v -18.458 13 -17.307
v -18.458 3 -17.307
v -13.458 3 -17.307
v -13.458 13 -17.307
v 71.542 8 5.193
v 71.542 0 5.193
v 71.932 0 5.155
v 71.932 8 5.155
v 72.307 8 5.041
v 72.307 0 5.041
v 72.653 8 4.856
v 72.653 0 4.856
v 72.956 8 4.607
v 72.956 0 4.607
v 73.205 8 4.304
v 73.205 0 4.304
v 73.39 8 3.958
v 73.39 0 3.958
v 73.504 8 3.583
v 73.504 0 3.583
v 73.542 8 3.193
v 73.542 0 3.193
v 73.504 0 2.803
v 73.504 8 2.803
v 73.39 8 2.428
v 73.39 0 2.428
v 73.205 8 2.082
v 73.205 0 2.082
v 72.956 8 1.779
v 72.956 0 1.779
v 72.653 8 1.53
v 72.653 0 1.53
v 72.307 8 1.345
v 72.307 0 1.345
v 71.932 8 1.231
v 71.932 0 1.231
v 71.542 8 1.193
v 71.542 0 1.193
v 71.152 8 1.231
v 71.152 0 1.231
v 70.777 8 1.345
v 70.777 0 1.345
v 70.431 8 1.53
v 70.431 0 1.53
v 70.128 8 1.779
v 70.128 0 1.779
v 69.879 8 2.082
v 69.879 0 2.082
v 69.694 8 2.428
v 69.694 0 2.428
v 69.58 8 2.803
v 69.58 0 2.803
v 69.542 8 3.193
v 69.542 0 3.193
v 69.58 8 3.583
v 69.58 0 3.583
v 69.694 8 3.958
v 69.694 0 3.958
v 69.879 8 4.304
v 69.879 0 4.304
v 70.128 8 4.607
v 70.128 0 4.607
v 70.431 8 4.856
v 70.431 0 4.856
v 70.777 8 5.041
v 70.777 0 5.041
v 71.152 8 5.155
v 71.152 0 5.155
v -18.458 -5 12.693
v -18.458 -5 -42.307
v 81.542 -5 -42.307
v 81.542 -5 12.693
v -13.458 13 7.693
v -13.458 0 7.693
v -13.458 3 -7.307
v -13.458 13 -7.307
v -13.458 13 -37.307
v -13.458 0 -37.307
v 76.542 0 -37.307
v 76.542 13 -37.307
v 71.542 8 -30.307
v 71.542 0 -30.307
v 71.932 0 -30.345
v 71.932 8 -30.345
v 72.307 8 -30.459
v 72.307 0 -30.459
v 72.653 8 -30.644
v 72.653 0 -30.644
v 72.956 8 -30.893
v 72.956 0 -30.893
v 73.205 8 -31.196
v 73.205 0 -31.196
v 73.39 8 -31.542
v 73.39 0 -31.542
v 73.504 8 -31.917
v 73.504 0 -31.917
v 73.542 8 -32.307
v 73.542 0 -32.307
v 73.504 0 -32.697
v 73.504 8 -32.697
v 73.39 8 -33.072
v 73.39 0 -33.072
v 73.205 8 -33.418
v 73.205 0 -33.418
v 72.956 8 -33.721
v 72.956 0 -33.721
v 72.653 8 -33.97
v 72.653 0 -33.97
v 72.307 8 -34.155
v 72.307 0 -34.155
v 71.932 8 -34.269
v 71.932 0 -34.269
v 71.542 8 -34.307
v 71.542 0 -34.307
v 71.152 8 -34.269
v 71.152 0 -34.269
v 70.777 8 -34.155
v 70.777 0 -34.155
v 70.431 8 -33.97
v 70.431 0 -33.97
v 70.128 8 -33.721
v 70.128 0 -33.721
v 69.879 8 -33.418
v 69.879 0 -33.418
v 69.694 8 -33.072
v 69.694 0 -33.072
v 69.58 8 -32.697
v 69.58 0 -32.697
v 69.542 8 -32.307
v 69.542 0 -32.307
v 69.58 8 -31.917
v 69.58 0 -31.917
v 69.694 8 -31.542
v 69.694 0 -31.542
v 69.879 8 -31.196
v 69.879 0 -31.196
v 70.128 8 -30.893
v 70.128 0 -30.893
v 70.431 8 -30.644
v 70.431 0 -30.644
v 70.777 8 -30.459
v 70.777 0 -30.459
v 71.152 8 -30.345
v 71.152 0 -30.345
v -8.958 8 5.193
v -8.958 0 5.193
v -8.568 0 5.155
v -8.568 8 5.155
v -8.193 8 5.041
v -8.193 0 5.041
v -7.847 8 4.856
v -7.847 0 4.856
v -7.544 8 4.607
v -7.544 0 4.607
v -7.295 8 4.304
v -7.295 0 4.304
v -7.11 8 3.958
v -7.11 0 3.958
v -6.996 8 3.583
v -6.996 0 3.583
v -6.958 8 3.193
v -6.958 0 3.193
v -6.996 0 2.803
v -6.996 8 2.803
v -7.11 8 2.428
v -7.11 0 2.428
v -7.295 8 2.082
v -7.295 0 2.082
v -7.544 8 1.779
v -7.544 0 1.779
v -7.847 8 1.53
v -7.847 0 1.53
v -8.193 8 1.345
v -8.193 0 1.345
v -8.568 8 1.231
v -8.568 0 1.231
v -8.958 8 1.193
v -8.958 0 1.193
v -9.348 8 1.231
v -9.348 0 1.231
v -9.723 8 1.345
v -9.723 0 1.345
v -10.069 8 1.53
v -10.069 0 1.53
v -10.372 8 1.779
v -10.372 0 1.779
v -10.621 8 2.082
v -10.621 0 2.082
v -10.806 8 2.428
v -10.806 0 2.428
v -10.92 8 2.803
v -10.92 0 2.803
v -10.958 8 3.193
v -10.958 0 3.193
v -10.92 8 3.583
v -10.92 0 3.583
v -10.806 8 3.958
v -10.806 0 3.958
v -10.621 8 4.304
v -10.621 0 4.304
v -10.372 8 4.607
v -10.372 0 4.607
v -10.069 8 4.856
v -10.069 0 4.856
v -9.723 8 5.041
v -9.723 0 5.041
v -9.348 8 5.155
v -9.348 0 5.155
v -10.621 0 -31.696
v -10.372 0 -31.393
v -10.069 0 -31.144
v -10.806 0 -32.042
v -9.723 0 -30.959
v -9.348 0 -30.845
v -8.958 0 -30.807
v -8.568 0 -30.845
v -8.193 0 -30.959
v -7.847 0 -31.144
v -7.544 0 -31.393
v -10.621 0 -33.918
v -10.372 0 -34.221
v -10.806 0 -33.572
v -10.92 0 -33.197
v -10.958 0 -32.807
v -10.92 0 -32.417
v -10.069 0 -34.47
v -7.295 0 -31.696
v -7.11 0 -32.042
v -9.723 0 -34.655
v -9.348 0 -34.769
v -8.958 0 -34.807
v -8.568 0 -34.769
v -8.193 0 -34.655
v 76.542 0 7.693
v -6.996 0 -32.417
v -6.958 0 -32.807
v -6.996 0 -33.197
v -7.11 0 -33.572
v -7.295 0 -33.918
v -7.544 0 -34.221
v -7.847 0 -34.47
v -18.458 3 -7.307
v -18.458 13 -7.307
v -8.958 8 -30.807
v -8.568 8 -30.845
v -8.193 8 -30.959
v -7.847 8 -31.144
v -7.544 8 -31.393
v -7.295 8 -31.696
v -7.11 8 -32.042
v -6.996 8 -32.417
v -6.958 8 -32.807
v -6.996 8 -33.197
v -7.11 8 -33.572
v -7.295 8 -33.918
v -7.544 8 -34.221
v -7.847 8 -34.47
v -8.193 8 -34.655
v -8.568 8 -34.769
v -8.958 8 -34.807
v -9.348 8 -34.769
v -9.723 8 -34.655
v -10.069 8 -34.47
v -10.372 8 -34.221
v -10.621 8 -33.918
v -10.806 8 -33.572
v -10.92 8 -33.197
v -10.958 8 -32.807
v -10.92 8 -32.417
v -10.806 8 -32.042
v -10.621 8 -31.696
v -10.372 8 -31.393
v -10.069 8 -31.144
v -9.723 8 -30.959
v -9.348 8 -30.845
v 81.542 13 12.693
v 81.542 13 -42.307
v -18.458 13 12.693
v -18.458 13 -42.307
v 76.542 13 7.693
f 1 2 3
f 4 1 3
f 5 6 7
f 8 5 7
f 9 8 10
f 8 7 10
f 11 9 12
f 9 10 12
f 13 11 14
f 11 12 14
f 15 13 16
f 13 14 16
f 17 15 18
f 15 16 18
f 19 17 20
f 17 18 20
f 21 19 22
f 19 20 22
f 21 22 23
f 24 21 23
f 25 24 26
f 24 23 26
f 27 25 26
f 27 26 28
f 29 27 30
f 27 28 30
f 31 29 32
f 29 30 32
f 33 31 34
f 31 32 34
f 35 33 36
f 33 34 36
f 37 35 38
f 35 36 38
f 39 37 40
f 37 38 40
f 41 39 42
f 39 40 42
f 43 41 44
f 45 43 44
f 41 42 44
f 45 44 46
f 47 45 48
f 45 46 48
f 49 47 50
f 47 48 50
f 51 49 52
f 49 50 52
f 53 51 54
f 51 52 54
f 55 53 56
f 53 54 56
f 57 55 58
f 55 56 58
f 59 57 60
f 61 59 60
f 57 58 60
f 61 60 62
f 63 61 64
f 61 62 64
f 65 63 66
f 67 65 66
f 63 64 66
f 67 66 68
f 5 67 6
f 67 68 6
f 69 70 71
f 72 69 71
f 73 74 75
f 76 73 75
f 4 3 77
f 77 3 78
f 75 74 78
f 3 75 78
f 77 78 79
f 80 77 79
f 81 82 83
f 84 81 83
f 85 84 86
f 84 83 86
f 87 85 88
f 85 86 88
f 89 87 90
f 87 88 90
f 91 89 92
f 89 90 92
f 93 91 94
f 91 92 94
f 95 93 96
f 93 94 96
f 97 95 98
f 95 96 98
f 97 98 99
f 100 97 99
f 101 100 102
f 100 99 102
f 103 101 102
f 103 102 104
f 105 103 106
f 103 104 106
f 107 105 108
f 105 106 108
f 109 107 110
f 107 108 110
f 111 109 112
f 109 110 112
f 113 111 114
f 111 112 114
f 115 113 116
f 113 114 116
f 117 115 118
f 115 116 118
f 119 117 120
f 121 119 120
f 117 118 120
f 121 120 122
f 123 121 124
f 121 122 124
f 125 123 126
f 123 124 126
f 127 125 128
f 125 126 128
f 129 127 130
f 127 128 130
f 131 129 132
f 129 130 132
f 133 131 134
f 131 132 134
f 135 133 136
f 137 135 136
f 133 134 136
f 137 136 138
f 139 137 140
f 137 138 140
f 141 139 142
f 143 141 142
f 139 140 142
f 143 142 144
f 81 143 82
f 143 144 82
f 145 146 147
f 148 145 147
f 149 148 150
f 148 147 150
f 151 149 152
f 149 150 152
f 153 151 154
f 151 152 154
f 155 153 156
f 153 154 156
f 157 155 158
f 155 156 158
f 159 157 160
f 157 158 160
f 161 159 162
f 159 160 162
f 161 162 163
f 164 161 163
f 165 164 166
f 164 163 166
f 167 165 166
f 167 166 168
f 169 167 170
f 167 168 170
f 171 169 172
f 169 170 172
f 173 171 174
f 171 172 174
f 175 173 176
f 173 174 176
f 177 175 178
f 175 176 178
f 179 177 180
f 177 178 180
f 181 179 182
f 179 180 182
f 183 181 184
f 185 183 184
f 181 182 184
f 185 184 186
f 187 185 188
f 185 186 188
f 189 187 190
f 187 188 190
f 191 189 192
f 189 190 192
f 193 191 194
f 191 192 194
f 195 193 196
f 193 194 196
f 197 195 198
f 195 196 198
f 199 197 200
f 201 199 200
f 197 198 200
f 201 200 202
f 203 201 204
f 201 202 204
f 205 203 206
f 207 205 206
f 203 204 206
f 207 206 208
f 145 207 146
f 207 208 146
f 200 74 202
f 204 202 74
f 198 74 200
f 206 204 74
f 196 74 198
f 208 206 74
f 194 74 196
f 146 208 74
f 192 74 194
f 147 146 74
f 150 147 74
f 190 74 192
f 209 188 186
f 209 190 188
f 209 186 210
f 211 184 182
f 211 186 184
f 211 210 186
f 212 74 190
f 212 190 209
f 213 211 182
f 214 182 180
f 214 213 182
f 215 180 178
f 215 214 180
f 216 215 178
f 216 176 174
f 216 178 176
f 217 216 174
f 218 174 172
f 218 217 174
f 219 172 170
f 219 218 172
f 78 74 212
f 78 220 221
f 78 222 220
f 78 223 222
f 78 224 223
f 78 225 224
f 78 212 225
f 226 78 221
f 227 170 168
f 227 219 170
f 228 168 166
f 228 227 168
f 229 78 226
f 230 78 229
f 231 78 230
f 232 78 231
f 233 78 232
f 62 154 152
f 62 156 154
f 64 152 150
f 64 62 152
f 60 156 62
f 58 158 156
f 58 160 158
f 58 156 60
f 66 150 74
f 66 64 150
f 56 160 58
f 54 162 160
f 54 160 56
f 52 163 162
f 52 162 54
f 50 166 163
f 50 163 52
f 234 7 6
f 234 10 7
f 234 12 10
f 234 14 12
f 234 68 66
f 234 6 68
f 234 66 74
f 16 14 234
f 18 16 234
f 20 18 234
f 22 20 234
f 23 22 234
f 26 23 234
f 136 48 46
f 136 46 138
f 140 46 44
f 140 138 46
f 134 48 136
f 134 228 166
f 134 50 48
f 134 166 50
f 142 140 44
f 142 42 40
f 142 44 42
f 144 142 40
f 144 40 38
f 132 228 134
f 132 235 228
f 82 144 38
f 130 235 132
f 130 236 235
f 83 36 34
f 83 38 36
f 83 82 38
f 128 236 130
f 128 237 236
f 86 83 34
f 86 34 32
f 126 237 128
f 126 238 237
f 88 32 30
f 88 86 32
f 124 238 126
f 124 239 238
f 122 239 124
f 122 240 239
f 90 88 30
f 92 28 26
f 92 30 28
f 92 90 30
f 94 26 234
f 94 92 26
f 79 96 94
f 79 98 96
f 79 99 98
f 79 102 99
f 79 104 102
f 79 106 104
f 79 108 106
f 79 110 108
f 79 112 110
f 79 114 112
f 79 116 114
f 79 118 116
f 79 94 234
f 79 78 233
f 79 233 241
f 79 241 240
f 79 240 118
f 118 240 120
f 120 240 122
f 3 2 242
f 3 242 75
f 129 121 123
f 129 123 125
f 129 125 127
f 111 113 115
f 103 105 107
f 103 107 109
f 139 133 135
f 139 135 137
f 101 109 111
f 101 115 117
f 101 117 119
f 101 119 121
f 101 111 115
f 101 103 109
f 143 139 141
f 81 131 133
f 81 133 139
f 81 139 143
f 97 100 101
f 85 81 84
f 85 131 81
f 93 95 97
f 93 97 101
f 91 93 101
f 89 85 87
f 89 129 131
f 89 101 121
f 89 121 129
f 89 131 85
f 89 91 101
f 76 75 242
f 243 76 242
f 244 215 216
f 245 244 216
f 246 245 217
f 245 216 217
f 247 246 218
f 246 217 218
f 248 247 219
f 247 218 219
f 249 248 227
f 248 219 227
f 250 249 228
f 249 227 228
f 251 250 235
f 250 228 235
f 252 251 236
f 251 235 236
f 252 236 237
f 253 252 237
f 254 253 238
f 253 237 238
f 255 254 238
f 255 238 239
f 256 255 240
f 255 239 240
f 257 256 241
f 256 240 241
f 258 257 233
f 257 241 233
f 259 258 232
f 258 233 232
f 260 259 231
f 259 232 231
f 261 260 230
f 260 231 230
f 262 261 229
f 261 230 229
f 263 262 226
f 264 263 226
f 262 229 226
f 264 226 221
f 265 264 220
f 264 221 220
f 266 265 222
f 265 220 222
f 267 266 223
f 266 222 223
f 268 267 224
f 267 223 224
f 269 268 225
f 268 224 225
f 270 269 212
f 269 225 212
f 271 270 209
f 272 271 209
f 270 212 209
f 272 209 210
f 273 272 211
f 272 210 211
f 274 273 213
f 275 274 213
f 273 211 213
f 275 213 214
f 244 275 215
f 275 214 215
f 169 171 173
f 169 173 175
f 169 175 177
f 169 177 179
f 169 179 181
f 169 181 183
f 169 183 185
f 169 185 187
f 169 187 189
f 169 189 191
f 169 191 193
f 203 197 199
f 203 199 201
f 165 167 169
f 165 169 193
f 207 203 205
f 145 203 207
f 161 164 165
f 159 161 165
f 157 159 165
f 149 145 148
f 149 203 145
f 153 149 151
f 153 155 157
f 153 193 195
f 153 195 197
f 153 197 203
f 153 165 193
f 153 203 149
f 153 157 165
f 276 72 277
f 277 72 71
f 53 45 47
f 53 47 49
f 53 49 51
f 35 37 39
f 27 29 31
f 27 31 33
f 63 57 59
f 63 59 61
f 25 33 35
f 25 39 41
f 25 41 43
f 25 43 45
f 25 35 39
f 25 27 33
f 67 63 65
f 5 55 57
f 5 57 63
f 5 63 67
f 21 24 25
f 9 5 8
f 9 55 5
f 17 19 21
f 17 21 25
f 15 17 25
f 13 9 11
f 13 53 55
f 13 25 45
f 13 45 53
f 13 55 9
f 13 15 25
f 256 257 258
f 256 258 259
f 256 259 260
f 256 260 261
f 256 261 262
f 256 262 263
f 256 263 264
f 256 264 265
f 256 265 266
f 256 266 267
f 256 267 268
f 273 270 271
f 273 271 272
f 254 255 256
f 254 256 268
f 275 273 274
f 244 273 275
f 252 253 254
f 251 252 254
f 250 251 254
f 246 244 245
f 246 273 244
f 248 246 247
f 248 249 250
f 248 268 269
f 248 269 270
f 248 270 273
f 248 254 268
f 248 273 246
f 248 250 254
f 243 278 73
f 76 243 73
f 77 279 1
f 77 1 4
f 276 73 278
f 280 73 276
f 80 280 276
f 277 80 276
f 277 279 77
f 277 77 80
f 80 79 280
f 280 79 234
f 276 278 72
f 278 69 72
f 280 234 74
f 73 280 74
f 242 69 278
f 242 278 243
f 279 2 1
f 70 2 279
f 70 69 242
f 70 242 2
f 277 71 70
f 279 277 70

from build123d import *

# Parameters (mm, degrees)
SKETCH1_W           = 99.999999898
SKETCH1_H           = 54.999999982
BOSS_EXTRUDE4_DEPTH = 5
BOSS_EXTRUDE6_DEPTH = 13
SKETCH2_3_W         = 5
SKETCH2_3_H         = 10
BOSS_EXTRUDE7_DEPTH = 3
SKETCH4_R           = 2
BOSS_EXTRUDE8_DEPTH = 8


with BuildPart() as part:
    # Sketch1 → Boss-Extrude4 (new body)
    with BuildSketch(Plane(origin=(0, 0, 0), x_dir=(1, 0, 0), z_dir=(0, 1, 0))):
        with Locations((31.542022725, 14.806957854)):
            Rectangle(SKETCH1_W, SKETCH1_H)
    extrude(amount=-BOSS_EXTRUDE4_DEPTH)

    # Sketch2 → Boss-Extrude6 (add)
    with BuildSketch(Plane(origin=(0, 0, 0), x_dir=(1, 0, 0), z_dir=(0, 1, 0))):
        Polygon((81.542022674, 42.306957845), (-18.457977224, 42.306957845), (-18.457977224, 17.306957845), (-13.457977224, 17.306957845), (-13.457977224, 37.306957845), (76.542022776, 37.306957845), (76.542022776, -7.693042155), (-13.457977224, -7.693042155), (-13.457977224, 7.306957845), (-18.457977224, 7.306957845), (-18.457977224, -12.693042137), (81.542022674, -12.693042137), align=None)
    extrude(amount=BOSS_EXTRUDE6_DEPTH)

    # Sketch2<3> → Boss-Extrude7 (add)
    with BuildSketch(Plane(origin=(0, 0, 0), x_dir=(1, 0, 0), z_dir=(0, 1, 0))):
        with Locations((-15.957977224, 12.306957845)):
            Rectangle(SKETCH2_3_W, SKETCH2_3_H)
    extrude(amount=BOSS_EXTRUDE7_DEPTH)

    # Sketch4 → Boss-Extrude8 (add)
    with BuildSketch(Plane(origin=(0, 0, 0), x_dir=(1, 0, 0), z_dir=(0, 1, 0))):
        with Locations((-8.957977224, 32.806957845)):
            Circle(SKETCH4_R)
        with Locations((-8.957977224, -3.193042155)):
            Circle(SKETCH4_R)
        with Locations((71.542022776, -3.193042155)):
            Circle(SKETCH4_R)
        with Locations((71.542022776, 32.306957845)):
            Circle(SKETCH4_R)
    extrude(amount=BOSS_EXTRUDE8_DEPTH)


solid = part.part
